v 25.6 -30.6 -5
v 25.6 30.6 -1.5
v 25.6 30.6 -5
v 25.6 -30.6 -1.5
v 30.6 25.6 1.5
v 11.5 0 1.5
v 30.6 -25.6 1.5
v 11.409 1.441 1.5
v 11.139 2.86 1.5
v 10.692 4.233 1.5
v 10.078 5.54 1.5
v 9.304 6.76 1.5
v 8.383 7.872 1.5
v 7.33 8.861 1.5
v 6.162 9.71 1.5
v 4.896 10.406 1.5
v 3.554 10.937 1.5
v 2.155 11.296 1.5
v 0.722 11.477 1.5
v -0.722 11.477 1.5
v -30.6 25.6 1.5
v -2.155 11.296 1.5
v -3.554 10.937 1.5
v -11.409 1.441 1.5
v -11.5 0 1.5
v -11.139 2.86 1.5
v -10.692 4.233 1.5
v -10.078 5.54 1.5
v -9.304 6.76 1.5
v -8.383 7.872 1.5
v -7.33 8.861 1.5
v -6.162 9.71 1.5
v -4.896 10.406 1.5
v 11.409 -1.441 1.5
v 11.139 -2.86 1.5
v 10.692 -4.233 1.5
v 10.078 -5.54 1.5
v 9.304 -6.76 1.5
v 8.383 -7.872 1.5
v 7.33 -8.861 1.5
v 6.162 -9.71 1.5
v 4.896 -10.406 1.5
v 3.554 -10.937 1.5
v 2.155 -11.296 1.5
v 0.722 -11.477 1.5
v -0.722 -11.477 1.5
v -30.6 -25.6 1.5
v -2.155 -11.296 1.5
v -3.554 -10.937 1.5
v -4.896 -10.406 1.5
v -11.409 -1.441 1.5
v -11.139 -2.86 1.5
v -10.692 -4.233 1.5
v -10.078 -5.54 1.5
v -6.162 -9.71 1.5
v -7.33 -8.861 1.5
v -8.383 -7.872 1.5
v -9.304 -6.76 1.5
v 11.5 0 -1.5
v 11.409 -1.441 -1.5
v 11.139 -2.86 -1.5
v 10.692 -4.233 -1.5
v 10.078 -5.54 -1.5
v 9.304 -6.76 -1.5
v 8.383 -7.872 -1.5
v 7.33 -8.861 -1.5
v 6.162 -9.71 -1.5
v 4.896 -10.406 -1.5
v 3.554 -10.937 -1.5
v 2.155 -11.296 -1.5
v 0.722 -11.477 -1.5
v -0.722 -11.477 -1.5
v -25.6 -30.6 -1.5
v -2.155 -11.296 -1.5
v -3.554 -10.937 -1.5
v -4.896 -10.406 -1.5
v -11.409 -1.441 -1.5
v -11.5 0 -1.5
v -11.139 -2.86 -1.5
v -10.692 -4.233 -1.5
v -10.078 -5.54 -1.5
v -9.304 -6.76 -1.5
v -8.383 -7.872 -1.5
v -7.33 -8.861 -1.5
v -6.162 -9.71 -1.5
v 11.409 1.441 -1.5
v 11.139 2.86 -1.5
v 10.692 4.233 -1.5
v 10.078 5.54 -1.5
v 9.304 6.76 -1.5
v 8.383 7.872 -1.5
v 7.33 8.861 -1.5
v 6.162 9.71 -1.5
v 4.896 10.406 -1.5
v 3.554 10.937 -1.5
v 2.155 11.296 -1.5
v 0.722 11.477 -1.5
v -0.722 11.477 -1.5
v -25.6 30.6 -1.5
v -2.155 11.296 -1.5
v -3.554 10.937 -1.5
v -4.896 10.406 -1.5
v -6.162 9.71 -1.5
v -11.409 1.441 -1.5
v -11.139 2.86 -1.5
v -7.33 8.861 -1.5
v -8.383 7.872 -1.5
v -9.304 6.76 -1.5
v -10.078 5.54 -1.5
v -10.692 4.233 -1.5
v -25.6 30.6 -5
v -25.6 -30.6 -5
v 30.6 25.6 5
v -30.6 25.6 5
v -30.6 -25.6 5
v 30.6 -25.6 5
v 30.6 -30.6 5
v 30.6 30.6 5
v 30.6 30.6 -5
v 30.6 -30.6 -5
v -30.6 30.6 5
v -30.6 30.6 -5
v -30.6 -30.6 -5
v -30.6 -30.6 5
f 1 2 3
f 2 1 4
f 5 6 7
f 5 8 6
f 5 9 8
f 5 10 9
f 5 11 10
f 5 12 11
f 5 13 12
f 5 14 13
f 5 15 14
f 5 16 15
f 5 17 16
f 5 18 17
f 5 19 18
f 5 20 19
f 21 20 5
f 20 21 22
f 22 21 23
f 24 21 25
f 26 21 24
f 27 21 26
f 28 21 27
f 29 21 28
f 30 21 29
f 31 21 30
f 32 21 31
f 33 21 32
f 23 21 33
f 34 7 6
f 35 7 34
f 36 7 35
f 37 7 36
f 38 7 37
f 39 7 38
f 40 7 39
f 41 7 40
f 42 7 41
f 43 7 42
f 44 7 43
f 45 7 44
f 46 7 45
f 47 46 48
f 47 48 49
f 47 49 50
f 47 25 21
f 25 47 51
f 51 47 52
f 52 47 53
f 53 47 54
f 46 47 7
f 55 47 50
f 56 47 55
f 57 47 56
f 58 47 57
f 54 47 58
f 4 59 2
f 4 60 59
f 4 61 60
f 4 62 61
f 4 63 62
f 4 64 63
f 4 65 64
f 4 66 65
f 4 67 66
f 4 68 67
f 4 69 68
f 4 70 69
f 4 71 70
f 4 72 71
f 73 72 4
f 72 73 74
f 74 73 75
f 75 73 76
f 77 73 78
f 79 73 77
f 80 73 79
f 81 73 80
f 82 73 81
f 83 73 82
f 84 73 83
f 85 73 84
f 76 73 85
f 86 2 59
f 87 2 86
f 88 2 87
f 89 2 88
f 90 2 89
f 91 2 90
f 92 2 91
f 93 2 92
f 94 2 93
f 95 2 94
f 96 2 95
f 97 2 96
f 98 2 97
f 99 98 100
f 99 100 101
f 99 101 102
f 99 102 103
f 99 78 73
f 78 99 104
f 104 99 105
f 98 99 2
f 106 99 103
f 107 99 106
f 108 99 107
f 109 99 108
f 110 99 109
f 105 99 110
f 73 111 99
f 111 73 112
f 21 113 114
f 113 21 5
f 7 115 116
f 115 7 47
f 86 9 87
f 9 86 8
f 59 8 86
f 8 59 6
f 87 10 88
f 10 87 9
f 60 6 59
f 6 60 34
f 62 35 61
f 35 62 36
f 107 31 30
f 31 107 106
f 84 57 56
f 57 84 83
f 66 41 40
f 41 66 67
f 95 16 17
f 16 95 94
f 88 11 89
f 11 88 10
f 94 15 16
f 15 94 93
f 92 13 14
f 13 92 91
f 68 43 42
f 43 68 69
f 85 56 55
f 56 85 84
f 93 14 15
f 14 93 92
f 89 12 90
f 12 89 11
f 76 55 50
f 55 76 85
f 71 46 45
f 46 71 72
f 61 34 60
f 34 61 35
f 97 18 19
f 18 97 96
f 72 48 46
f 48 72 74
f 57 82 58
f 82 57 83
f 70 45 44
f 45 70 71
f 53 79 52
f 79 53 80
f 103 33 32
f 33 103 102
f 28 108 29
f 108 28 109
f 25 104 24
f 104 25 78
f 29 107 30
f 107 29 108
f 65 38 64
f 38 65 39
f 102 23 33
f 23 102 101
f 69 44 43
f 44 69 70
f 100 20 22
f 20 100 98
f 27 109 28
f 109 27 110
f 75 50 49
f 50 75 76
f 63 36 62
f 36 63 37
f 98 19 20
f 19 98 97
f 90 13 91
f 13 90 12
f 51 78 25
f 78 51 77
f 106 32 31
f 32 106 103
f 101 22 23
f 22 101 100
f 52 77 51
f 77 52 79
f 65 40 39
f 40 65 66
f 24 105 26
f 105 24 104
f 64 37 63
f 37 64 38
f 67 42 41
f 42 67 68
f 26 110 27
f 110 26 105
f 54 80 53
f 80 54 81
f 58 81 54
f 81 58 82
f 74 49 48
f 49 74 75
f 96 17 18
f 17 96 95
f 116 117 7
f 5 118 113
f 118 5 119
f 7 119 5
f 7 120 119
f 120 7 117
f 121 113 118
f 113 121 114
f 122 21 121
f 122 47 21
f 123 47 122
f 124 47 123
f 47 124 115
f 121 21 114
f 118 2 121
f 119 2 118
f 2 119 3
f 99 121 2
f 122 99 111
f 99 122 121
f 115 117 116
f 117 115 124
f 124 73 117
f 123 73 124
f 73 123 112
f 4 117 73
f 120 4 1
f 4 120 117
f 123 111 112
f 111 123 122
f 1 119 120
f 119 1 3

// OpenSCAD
$fn = 50;

//base width and length
x1 = 51.2;
//base thickness
x4 = 3;
//rail top & bottom height
x2 = 3.5;
//rail top & bottom thickness
x3 = 5;
//shaft hole
xd1 = 23;


module shaft(){
//shaft hole
union(){
translate([0,0,0])
cylinder(h = x4+1, d1 = xd1, d2 = xd1, 
    center = true);}}
    
difference(){
    
//base
rotate([0,0,0])
translate([0,0,0])
cube([x1,x1,x4], center=true);
    
//shaft hole
translate([0,0,0])
shaft();   
}

//rail top back
rotate([0,0,0])
translate([0,x1/2+x3/2,(x2/2)+(x4/2)+(-x4/2)])
cube([x1+x3*2,x3,x2+x4], center=true);

//rail top front
rotate([0,0,0])
translate([0,-x1/2+-x3/2,(x2/2)+(x4/2)+(-x4/2)])
cube([x1+x3*2,x3,x2+x4], center=true);

//rail bottom left
rotate([0,0,90])
translate([0,x1/2+x3/2,-(x2/2)+(x4/2)+(-x4/2)])
cube([x1+x3*2,x3,x2+x4], center=true);

//rail bottom right
rotate([0,0,90])
translate([0,-x1/2+-x3/2,-(x2/2)+(x4/2)+(-x4/2)])
cube([x1+x3*2,x3,x2+x4], center=true);
